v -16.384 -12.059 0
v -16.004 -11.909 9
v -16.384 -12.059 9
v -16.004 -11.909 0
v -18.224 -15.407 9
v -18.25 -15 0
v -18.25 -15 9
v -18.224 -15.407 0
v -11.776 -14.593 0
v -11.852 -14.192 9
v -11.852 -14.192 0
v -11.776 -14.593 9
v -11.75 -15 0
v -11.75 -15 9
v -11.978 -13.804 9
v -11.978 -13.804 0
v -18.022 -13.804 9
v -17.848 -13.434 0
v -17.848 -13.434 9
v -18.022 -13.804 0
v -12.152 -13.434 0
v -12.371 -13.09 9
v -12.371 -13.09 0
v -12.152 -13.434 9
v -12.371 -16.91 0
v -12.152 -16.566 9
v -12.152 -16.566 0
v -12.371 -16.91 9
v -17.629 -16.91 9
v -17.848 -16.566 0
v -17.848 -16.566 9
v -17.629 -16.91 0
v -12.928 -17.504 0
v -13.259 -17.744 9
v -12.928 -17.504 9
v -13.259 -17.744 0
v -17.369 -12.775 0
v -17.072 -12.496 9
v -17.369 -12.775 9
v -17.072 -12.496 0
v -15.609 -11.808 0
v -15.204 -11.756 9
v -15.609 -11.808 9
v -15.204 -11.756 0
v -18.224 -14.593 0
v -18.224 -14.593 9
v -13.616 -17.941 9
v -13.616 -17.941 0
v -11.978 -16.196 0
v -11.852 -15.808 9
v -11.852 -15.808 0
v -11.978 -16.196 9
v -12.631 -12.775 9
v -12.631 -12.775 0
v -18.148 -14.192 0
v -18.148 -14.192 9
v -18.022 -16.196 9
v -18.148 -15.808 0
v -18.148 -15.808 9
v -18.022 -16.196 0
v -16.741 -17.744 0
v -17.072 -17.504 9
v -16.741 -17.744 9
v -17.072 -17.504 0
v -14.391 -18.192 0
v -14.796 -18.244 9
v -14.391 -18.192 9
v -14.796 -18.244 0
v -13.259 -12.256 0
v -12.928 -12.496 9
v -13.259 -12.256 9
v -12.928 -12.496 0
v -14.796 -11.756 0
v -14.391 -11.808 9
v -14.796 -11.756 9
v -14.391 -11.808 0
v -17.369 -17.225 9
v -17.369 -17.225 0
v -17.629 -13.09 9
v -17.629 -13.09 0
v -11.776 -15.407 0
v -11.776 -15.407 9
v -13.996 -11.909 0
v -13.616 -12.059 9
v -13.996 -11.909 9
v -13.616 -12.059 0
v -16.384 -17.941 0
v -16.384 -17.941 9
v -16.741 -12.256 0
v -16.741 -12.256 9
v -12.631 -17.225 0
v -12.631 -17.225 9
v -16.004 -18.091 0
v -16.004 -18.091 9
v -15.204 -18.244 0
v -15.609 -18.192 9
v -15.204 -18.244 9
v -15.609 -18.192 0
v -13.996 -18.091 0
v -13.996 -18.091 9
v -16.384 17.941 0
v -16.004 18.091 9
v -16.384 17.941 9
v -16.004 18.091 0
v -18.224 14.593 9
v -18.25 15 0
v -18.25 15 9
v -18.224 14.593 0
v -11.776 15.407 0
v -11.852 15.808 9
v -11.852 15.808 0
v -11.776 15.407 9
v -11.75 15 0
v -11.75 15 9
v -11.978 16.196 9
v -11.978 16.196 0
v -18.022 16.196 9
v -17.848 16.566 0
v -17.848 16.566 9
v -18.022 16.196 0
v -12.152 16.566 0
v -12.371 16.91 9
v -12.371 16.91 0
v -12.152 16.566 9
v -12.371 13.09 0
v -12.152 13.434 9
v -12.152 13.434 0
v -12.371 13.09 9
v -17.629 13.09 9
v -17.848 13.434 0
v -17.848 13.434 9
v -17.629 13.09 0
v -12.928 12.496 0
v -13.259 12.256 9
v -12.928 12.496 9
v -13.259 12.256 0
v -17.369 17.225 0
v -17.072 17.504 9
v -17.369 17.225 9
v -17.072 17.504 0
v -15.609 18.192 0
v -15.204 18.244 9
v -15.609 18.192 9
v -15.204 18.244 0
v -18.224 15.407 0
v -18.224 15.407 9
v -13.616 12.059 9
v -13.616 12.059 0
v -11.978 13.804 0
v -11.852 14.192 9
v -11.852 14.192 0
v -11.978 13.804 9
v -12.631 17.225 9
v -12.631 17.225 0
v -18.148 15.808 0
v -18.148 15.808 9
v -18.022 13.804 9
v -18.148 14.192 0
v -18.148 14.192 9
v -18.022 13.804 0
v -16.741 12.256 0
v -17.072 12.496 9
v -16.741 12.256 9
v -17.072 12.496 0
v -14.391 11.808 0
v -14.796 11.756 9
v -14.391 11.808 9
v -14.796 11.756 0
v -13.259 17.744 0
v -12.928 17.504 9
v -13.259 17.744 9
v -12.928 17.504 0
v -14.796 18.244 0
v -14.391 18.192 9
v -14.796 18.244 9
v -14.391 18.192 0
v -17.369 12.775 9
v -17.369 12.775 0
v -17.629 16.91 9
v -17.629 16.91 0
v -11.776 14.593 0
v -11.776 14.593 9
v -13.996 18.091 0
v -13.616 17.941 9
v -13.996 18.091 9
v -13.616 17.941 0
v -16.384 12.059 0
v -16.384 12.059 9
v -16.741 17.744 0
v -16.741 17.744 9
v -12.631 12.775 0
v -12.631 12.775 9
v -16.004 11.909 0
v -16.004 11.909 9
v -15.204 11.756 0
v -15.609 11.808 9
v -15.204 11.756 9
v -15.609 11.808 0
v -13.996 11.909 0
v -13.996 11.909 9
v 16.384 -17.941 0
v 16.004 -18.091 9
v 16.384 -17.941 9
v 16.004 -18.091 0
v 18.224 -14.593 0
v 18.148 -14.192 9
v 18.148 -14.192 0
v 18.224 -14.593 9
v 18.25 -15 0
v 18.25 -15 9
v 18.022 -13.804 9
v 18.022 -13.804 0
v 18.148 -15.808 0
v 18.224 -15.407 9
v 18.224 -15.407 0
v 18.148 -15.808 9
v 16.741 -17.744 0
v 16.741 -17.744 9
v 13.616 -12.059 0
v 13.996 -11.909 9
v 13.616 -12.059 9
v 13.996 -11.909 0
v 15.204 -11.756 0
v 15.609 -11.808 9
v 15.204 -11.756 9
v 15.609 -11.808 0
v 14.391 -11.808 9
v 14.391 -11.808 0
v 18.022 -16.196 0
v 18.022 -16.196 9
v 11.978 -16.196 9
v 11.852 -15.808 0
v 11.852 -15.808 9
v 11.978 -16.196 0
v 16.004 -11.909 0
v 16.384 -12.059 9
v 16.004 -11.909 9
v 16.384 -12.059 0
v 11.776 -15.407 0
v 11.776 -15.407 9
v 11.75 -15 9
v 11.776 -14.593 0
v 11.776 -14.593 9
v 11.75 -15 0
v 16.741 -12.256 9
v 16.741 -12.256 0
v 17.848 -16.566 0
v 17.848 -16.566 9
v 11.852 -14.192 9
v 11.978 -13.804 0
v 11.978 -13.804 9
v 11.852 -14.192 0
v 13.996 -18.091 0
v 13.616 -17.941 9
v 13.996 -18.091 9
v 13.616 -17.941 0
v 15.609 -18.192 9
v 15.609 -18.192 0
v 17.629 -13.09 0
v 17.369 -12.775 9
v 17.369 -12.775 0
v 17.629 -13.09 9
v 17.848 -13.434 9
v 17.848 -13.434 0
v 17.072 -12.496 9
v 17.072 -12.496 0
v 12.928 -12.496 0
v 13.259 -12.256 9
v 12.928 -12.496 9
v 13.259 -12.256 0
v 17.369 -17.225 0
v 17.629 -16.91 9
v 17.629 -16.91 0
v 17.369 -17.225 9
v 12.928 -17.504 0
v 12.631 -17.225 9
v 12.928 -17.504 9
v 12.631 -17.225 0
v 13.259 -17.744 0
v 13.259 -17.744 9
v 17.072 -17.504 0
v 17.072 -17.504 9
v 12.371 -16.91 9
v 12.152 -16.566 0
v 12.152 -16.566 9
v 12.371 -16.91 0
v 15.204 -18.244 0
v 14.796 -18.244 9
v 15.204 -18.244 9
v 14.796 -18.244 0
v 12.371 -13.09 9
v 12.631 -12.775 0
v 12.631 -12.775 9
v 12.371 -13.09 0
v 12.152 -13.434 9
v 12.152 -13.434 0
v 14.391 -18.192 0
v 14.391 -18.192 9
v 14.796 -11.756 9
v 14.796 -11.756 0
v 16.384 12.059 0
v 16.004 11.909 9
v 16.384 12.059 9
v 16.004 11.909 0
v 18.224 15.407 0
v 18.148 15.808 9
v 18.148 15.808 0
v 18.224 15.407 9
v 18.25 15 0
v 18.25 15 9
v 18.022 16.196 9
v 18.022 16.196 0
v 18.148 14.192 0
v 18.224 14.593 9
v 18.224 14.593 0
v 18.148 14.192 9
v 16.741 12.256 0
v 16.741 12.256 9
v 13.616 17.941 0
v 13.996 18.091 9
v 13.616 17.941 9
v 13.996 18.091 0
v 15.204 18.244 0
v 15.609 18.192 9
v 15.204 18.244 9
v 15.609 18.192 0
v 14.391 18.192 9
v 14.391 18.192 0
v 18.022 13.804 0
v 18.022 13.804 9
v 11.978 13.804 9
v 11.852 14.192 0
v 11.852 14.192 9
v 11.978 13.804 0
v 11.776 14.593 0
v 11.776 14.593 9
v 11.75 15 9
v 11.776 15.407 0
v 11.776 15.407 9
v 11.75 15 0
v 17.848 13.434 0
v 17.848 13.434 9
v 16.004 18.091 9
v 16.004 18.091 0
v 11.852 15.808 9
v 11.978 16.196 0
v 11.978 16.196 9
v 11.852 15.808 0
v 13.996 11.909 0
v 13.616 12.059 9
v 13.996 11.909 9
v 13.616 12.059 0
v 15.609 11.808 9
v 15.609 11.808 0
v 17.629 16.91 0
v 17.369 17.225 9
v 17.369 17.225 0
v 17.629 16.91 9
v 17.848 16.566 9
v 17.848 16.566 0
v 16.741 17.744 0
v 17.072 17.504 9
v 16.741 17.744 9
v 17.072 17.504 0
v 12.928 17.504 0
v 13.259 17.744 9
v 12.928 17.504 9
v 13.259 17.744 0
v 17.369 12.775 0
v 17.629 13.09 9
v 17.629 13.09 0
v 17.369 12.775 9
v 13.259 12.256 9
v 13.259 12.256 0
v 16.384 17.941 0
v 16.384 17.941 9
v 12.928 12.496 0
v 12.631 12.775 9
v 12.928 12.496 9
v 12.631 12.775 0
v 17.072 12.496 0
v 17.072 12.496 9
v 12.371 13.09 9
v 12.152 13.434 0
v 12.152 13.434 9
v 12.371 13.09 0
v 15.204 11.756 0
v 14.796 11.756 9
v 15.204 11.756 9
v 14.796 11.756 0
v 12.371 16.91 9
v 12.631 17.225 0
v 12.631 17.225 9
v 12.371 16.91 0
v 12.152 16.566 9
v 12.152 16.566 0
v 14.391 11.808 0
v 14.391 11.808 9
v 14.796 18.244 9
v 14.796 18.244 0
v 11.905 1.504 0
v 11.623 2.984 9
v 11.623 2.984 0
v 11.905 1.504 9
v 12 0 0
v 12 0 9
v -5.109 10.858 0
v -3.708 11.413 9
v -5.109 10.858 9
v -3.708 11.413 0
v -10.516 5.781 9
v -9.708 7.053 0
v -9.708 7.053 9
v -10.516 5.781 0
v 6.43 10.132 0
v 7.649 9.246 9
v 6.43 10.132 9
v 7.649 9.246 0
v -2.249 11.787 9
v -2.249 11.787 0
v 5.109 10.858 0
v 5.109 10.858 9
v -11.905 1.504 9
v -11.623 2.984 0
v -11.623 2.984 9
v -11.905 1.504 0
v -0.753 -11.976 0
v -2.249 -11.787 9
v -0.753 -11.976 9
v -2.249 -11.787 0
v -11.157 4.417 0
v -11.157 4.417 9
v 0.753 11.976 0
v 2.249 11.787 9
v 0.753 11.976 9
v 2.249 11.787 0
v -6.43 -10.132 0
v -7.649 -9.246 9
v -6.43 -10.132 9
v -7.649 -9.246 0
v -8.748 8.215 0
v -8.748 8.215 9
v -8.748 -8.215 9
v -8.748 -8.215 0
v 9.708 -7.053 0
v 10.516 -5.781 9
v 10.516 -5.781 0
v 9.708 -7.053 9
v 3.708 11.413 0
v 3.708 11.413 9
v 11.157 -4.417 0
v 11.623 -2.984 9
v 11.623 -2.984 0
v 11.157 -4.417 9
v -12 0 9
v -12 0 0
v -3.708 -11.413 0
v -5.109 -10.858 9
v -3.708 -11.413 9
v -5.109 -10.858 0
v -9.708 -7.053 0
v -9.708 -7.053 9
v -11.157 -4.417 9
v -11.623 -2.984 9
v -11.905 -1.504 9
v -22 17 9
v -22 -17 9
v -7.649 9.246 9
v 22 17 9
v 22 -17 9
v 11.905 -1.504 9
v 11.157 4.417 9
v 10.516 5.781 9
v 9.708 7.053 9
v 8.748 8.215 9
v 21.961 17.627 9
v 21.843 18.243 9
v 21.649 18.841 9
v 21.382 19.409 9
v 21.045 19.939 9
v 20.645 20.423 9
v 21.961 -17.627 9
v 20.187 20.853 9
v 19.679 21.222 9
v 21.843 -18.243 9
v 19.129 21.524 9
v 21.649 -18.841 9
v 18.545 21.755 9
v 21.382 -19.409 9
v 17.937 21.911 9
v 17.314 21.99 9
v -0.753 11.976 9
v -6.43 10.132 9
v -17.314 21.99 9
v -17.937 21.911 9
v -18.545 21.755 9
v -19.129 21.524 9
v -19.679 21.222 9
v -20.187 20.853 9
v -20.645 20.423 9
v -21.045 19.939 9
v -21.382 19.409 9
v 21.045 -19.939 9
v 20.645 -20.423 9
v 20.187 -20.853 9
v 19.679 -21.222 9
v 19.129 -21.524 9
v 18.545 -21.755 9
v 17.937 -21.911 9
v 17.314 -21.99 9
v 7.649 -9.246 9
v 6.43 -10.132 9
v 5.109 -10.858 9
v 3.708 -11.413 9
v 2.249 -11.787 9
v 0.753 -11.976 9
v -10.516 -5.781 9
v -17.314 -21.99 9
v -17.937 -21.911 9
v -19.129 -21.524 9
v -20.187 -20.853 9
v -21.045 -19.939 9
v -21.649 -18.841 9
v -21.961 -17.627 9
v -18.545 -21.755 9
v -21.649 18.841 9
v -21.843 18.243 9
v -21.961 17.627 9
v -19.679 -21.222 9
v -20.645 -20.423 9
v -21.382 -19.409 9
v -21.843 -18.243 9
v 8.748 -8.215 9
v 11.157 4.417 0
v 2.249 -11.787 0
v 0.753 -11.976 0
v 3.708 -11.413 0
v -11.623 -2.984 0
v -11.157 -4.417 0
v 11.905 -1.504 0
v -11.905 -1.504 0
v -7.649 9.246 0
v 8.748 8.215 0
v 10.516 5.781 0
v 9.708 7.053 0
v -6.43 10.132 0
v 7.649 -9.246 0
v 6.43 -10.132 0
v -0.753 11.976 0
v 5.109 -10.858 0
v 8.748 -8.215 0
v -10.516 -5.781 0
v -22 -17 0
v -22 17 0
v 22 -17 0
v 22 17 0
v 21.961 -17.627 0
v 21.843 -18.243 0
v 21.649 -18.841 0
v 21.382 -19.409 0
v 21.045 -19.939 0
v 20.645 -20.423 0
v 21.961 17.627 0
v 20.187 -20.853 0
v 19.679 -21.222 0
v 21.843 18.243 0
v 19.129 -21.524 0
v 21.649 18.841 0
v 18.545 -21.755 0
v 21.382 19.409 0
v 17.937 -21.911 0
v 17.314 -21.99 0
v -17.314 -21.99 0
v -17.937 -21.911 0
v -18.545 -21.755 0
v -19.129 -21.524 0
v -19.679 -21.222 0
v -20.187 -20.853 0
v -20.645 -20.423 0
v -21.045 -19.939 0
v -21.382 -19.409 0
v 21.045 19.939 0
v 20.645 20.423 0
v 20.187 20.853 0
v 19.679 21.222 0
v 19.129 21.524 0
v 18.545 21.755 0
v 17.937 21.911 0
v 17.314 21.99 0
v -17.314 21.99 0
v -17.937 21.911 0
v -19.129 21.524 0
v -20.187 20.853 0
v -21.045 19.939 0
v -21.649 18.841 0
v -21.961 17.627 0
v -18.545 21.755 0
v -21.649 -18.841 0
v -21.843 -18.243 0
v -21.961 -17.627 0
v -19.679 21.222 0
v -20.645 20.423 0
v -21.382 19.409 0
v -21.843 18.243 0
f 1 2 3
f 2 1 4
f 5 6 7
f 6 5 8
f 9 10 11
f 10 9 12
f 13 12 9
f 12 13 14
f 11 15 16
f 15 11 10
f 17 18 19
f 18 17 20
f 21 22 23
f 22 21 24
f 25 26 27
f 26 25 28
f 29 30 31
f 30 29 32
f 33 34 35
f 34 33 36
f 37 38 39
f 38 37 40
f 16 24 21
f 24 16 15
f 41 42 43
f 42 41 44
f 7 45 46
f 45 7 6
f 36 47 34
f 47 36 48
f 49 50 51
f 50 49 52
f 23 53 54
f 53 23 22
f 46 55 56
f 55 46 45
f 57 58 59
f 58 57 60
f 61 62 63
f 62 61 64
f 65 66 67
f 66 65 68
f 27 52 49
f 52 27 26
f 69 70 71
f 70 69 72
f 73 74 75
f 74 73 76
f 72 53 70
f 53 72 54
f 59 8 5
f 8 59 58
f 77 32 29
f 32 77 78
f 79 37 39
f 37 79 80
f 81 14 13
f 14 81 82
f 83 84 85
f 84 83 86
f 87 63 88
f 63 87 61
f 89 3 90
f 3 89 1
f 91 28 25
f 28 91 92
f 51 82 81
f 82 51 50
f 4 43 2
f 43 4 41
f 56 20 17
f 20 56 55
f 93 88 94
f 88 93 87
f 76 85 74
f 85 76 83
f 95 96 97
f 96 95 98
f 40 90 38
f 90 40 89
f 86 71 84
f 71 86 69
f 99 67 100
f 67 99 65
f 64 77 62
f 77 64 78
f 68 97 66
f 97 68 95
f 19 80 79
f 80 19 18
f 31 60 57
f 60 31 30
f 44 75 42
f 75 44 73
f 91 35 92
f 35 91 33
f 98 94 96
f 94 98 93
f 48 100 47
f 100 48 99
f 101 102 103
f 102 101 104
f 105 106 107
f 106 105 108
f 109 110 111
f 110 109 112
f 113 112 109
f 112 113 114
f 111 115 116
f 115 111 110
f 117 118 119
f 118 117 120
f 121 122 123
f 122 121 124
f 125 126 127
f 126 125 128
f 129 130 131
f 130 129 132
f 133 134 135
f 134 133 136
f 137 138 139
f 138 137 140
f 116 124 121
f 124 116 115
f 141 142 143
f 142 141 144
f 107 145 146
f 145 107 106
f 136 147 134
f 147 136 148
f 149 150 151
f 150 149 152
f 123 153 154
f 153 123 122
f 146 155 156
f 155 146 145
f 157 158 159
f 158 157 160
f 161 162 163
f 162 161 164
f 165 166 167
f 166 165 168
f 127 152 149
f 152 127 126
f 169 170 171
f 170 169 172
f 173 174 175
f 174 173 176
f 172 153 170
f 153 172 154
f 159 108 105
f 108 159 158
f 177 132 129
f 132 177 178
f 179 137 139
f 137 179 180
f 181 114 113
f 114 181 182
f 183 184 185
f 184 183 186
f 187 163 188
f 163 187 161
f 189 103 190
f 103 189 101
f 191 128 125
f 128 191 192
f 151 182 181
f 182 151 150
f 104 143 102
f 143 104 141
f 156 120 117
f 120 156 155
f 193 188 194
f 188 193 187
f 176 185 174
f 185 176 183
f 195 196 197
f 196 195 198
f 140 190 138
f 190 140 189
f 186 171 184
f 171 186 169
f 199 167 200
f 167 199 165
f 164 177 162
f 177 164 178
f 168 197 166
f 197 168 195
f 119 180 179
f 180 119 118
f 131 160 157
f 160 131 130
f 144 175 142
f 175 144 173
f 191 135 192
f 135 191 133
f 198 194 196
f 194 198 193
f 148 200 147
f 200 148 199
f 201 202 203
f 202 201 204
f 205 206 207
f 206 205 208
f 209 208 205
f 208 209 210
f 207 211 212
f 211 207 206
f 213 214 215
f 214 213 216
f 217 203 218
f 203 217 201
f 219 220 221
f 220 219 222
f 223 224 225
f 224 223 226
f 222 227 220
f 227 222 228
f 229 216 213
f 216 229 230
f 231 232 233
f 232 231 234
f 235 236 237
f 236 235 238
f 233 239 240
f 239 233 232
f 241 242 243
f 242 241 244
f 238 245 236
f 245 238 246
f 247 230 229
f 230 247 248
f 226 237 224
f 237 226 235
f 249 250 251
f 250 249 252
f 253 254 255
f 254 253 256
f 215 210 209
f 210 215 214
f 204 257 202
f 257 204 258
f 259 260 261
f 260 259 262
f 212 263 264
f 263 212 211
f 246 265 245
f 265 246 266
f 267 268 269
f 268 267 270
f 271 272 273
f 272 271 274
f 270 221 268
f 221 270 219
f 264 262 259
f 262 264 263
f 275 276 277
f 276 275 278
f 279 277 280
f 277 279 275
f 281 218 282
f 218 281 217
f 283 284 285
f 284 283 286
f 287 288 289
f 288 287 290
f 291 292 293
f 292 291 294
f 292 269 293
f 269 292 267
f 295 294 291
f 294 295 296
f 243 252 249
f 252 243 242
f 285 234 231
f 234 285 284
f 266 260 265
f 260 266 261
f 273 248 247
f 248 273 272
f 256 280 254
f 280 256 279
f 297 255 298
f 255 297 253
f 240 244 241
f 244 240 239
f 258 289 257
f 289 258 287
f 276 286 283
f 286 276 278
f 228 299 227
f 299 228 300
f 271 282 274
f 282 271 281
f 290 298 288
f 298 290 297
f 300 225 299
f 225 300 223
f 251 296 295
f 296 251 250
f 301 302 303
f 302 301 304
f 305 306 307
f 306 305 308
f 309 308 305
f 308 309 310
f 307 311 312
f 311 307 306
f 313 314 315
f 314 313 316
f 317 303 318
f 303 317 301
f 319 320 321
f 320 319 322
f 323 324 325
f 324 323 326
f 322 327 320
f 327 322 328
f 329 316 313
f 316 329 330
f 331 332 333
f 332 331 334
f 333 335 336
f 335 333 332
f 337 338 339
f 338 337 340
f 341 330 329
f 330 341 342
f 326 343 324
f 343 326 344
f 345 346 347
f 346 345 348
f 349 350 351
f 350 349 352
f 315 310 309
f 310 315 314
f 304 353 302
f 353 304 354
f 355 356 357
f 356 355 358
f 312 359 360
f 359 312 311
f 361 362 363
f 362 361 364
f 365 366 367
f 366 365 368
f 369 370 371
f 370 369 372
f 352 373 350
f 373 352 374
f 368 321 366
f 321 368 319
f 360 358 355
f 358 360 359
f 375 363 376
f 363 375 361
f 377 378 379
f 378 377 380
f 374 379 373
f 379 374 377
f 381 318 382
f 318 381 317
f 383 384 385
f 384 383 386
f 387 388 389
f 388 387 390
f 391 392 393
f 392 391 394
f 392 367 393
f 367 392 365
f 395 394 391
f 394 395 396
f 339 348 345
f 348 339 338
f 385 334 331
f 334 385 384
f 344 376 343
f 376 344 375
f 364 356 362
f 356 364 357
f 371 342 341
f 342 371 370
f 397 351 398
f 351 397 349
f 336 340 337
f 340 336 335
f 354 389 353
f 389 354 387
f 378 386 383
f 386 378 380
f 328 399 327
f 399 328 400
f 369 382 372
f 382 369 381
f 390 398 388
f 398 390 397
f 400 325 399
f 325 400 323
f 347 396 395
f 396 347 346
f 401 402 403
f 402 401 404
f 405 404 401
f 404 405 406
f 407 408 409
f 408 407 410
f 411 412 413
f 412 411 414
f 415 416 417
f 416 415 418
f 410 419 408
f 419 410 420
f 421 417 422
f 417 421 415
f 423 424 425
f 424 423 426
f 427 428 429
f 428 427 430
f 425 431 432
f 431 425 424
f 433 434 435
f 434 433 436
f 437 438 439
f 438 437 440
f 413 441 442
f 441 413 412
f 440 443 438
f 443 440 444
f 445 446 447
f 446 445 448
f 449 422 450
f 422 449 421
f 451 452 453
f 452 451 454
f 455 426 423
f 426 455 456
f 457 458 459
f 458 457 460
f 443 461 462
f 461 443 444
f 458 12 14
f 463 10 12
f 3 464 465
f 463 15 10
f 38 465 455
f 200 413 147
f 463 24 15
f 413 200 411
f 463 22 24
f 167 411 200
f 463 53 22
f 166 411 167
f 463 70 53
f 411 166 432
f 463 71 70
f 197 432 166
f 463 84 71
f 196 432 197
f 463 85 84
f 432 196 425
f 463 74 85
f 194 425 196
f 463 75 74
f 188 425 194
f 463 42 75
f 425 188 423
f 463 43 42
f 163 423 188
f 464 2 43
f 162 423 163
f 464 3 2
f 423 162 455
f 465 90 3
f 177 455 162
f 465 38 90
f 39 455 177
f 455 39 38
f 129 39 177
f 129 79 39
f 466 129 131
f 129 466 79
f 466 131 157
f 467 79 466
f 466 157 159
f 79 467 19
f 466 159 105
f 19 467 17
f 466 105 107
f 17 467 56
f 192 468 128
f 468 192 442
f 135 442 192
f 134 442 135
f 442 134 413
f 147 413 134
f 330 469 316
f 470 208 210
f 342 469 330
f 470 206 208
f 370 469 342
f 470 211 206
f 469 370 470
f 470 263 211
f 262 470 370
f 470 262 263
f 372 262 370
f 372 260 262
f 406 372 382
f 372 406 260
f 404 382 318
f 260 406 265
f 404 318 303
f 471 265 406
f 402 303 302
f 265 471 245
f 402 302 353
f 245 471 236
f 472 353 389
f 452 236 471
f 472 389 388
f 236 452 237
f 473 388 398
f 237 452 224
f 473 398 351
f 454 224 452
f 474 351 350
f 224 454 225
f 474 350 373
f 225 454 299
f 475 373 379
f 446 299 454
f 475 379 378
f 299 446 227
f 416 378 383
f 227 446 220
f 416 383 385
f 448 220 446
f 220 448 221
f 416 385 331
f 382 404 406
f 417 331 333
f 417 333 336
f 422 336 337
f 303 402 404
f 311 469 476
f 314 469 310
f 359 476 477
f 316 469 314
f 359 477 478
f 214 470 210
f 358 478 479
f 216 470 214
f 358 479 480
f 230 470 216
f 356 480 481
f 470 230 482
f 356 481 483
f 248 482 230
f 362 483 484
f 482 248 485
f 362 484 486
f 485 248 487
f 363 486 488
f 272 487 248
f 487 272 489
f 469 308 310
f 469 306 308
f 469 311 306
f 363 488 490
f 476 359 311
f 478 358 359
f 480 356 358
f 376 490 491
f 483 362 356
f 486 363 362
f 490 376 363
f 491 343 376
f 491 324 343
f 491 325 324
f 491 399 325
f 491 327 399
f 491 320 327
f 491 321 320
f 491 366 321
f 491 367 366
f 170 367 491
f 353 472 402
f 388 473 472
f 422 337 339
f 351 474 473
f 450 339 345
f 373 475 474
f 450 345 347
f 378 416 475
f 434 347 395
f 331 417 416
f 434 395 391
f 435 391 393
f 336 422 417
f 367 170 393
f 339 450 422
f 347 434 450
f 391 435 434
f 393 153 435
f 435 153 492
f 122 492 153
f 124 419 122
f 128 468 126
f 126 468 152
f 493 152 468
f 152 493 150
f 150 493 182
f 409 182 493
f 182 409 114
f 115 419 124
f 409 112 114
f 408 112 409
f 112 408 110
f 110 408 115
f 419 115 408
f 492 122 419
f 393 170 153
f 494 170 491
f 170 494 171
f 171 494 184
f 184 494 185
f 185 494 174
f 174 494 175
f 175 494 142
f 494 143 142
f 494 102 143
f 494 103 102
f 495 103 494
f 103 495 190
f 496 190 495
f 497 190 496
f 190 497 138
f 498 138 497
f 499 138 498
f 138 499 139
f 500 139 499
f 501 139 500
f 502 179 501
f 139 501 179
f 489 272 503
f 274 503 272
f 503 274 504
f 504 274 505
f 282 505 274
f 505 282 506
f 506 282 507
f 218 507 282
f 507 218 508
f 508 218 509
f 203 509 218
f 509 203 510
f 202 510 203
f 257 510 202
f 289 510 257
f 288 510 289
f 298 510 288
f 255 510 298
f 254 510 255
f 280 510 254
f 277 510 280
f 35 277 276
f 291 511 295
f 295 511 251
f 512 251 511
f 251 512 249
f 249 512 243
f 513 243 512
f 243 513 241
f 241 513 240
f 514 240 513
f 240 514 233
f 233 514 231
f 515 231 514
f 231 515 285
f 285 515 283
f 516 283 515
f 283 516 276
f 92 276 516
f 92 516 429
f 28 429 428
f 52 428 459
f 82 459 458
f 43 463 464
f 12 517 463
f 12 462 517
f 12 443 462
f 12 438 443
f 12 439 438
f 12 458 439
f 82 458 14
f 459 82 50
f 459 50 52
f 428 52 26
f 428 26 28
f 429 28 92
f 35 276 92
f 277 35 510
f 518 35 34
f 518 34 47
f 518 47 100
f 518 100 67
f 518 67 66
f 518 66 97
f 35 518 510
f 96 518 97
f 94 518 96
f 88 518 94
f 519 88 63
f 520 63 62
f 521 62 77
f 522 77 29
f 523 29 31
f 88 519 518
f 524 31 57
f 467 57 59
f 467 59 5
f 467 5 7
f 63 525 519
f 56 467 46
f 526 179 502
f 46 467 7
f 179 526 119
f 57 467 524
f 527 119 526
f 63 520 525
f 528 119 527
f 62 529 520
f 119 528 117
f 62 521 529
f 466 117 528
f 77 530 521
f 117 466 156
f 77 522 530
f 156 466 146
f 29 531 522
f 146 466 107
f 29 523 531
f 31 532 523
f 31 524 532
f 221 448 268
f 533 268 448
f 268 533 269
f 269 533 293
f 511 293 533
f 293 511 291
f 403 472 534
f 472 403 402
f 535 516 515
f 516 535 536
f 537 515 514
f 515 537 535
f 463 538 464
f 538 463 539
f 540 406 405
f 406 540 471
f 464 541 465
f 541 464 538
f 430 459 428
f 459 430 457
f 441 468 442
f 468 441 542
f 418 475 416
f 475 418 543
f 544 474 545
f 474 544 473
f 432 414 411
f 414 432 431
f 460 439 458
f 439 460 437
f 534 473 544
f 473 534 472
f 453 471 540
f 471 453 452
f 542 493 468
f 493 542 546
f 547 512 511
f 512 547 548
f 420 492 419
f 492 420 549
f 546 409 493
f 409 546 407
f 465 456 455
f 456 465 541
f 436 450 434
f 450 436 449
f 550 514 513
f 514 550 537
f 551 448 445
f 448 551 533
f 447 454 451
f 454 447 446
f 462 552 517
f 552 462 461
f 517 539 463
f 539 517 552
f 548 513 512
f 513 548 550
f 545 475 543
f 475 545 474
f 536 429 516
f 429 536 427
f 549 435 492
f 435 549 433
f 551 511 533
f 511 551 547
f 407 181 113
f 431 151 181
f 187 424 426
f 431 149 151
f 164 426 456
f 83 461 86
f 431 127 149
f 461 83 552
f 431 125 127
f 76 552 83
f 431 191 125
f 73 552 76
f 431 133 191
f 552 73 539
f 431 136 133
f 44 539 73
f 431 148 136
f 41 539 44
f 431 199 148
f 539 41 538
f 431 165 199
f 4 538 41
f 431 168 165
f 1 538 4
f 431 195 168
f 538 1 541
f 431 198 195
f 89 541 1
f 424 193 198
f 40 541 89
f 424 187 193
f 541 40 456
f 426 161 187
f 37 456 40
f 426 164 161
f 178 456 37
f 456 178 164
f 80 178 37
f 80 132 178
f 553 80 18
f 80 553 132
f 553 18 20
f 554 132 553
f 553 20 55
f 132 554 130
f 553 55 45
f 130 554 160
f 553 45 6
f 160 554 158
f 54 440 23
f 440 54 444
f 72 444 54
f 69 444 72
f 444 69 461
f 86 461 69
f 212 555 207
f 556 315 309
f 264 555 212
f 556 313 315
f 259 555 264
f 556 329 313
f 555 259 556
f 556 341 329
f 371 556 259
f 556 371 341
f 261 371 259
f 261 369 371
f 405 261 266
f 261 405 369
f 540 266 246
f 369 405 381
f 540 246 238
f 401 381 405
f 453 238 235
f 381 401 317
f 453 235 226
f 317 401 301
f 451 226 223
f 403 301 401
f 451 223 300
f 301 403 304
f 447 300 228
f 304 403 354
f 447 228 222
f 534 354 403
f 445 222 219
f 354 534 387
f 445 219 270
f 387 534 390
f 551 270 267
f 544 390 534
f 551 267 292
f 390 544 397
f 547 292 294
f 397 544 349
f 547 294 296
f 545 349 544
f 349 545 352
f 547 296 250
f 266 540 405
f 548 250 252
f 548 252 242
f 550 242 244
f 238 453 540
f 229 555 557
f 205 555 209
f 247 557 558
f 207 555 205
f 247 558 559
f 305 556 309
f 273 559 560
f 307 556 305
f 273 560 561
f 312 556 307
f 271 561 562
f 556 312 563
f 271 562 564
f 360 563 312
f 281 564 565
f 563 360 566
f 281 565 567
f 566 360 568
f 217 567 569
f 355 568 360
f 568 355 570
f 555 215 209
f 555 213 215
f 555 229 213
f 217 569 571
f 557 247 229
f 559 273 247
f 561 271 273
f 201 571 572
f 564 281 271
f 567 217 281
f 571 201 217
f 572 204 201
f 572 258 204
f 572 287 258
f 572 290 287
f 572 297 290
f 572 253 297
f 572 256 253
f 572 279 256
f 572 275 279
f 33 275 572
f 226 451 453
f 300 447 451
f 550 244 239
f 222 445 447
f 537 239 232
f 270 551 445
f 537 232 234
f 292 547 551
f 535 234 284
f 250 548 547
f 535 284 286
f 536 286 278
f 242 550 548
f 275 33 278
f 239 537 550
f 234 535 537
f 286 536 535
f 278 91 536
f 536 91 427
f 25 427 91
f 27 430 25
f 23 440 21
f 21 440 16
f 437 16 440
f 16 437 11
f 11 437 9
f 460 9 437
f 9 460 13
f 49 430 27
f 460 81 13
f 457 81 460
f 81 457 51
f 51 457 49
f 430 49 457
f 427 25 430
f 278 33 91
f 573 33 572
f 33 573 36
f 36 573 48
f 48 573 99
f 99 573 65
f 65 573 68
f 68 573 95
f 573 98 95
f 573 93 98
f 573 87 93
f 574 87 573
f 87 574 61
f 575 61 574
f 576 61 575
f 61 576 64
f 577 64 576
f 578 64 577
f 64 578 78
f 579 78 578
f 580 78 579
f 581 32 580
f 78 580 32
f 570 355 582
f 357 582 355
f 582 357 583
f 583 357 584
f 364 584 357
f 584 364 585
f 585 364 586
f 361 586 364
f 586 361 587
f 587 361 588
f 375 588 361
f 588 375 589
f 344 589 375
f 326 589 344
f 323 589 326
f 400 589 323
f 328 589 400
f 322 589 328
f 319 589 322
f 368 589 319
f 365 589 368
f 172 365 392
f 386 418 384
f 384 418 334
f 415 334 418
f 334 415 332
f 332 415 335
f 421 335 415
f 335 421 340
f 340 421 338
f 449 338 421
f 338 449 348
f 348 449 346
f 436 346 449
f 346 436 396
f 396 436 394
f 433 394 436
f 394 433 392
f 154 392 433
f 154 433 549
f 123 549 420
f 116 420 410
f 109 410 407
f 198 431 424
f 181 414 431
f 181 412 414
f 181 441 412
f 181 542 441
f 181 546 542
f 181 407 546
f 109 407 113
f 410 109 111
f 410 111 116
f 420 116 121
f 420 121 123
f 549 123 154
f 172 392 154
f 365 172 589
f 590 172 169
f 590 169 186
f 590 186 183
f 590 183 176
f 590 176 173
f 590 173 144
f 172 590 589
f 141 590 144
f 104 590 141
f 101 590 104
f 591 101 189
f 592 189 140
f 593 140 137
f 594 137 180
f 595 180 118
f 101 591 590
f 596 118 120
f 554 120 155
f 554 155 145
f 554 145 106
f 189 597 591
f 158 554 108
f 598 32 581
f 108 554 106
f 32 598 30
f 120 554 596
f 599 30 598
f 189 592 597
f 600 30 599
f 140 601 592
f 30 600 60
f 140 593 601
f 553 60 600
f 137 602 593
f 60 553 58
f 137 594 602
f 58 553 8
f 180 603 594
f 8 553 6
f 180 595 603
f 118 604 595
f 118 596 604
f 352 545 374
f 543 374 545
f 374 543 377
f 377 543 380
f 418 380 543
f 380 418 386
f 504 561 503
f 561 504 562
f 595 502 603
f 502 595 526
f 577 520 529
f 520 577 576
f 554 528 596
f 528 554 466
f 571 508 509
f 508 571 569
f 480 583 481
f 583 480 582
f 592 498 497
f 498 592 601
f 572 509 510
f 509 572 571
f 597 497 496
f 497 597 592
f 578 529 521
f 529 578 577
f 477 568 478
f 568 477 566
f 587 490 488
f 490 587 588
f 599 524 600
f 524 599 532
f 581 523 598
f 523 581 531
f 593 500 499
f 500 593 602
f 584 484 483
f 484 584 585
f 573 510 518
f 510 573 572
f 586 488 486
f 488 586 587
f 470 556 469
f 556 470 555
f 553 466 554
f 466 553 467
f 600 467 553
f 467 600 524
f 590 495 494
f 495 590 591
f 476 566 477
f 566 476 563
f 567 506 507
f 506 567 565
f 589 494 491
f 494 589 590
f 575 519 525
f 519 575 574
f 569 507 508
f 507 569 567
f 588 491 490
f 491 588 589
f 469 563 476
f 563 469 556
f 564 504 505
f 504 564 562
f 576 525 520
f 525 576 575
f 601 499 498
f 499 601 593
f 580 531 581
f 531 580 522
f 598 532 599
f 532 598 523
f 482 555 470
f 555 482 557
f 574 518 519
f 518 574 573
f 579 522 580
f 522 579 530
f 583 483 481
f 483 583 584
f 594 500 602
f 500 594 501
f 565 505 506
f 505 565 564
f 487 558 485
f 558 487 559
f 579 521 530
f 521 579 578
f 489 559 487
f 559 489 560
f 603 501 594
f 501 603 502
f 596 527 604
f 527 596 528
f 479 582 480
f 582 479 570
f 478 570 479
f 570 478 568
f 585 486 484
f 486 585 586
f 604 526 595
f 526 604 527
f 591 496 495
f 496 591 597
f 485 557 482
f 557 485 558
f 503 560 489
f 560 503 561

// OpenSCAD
$fn = 50;


difference() {
	union() {
		hull() {
			translate(v = [-17.0000000000, 17.0000000000, 0]) {
				cylinder(h = 9, r = 5);
			}
			translate(v = [17.0000000000, 17.0000000000, 0]) {
				cylinder(h = 9, r = 5);
			}
			translate(v = [-17.0000000000, -17.0000000000, 0]) {
				cylinder(h = 9, r = 5);
			}
			translate(v = [17.0000000000, -17.0000000000, 0]) {
				cylinder(h = 9, r = 5);
			}
		}
	}
	union() {
		#translate(v = [-15.0000000000, -15.0000000000, -100.0000000000]) {
			cylinder(h = 200, r = 3.2500000000);
		}
		#translate(v = [-15.0000000000, 15.0000000000, -100.0000000000]) {
			cylinder(h = 200, r = 3.2500000000);
		}
		#translate(v = [15.0000000000, -15.0000000000, -100.0000000000]) {
			cylinder(h = 200, r = 3.2500000000);
		}
		#translate(v = [15.0000000000, 15.0000000000, -100.0000000000]) {
			cylinder(h = 200, r = 3.2500000000);
		}
		#cylinder(h = 9, r = 12.0000000000);
	}
}
